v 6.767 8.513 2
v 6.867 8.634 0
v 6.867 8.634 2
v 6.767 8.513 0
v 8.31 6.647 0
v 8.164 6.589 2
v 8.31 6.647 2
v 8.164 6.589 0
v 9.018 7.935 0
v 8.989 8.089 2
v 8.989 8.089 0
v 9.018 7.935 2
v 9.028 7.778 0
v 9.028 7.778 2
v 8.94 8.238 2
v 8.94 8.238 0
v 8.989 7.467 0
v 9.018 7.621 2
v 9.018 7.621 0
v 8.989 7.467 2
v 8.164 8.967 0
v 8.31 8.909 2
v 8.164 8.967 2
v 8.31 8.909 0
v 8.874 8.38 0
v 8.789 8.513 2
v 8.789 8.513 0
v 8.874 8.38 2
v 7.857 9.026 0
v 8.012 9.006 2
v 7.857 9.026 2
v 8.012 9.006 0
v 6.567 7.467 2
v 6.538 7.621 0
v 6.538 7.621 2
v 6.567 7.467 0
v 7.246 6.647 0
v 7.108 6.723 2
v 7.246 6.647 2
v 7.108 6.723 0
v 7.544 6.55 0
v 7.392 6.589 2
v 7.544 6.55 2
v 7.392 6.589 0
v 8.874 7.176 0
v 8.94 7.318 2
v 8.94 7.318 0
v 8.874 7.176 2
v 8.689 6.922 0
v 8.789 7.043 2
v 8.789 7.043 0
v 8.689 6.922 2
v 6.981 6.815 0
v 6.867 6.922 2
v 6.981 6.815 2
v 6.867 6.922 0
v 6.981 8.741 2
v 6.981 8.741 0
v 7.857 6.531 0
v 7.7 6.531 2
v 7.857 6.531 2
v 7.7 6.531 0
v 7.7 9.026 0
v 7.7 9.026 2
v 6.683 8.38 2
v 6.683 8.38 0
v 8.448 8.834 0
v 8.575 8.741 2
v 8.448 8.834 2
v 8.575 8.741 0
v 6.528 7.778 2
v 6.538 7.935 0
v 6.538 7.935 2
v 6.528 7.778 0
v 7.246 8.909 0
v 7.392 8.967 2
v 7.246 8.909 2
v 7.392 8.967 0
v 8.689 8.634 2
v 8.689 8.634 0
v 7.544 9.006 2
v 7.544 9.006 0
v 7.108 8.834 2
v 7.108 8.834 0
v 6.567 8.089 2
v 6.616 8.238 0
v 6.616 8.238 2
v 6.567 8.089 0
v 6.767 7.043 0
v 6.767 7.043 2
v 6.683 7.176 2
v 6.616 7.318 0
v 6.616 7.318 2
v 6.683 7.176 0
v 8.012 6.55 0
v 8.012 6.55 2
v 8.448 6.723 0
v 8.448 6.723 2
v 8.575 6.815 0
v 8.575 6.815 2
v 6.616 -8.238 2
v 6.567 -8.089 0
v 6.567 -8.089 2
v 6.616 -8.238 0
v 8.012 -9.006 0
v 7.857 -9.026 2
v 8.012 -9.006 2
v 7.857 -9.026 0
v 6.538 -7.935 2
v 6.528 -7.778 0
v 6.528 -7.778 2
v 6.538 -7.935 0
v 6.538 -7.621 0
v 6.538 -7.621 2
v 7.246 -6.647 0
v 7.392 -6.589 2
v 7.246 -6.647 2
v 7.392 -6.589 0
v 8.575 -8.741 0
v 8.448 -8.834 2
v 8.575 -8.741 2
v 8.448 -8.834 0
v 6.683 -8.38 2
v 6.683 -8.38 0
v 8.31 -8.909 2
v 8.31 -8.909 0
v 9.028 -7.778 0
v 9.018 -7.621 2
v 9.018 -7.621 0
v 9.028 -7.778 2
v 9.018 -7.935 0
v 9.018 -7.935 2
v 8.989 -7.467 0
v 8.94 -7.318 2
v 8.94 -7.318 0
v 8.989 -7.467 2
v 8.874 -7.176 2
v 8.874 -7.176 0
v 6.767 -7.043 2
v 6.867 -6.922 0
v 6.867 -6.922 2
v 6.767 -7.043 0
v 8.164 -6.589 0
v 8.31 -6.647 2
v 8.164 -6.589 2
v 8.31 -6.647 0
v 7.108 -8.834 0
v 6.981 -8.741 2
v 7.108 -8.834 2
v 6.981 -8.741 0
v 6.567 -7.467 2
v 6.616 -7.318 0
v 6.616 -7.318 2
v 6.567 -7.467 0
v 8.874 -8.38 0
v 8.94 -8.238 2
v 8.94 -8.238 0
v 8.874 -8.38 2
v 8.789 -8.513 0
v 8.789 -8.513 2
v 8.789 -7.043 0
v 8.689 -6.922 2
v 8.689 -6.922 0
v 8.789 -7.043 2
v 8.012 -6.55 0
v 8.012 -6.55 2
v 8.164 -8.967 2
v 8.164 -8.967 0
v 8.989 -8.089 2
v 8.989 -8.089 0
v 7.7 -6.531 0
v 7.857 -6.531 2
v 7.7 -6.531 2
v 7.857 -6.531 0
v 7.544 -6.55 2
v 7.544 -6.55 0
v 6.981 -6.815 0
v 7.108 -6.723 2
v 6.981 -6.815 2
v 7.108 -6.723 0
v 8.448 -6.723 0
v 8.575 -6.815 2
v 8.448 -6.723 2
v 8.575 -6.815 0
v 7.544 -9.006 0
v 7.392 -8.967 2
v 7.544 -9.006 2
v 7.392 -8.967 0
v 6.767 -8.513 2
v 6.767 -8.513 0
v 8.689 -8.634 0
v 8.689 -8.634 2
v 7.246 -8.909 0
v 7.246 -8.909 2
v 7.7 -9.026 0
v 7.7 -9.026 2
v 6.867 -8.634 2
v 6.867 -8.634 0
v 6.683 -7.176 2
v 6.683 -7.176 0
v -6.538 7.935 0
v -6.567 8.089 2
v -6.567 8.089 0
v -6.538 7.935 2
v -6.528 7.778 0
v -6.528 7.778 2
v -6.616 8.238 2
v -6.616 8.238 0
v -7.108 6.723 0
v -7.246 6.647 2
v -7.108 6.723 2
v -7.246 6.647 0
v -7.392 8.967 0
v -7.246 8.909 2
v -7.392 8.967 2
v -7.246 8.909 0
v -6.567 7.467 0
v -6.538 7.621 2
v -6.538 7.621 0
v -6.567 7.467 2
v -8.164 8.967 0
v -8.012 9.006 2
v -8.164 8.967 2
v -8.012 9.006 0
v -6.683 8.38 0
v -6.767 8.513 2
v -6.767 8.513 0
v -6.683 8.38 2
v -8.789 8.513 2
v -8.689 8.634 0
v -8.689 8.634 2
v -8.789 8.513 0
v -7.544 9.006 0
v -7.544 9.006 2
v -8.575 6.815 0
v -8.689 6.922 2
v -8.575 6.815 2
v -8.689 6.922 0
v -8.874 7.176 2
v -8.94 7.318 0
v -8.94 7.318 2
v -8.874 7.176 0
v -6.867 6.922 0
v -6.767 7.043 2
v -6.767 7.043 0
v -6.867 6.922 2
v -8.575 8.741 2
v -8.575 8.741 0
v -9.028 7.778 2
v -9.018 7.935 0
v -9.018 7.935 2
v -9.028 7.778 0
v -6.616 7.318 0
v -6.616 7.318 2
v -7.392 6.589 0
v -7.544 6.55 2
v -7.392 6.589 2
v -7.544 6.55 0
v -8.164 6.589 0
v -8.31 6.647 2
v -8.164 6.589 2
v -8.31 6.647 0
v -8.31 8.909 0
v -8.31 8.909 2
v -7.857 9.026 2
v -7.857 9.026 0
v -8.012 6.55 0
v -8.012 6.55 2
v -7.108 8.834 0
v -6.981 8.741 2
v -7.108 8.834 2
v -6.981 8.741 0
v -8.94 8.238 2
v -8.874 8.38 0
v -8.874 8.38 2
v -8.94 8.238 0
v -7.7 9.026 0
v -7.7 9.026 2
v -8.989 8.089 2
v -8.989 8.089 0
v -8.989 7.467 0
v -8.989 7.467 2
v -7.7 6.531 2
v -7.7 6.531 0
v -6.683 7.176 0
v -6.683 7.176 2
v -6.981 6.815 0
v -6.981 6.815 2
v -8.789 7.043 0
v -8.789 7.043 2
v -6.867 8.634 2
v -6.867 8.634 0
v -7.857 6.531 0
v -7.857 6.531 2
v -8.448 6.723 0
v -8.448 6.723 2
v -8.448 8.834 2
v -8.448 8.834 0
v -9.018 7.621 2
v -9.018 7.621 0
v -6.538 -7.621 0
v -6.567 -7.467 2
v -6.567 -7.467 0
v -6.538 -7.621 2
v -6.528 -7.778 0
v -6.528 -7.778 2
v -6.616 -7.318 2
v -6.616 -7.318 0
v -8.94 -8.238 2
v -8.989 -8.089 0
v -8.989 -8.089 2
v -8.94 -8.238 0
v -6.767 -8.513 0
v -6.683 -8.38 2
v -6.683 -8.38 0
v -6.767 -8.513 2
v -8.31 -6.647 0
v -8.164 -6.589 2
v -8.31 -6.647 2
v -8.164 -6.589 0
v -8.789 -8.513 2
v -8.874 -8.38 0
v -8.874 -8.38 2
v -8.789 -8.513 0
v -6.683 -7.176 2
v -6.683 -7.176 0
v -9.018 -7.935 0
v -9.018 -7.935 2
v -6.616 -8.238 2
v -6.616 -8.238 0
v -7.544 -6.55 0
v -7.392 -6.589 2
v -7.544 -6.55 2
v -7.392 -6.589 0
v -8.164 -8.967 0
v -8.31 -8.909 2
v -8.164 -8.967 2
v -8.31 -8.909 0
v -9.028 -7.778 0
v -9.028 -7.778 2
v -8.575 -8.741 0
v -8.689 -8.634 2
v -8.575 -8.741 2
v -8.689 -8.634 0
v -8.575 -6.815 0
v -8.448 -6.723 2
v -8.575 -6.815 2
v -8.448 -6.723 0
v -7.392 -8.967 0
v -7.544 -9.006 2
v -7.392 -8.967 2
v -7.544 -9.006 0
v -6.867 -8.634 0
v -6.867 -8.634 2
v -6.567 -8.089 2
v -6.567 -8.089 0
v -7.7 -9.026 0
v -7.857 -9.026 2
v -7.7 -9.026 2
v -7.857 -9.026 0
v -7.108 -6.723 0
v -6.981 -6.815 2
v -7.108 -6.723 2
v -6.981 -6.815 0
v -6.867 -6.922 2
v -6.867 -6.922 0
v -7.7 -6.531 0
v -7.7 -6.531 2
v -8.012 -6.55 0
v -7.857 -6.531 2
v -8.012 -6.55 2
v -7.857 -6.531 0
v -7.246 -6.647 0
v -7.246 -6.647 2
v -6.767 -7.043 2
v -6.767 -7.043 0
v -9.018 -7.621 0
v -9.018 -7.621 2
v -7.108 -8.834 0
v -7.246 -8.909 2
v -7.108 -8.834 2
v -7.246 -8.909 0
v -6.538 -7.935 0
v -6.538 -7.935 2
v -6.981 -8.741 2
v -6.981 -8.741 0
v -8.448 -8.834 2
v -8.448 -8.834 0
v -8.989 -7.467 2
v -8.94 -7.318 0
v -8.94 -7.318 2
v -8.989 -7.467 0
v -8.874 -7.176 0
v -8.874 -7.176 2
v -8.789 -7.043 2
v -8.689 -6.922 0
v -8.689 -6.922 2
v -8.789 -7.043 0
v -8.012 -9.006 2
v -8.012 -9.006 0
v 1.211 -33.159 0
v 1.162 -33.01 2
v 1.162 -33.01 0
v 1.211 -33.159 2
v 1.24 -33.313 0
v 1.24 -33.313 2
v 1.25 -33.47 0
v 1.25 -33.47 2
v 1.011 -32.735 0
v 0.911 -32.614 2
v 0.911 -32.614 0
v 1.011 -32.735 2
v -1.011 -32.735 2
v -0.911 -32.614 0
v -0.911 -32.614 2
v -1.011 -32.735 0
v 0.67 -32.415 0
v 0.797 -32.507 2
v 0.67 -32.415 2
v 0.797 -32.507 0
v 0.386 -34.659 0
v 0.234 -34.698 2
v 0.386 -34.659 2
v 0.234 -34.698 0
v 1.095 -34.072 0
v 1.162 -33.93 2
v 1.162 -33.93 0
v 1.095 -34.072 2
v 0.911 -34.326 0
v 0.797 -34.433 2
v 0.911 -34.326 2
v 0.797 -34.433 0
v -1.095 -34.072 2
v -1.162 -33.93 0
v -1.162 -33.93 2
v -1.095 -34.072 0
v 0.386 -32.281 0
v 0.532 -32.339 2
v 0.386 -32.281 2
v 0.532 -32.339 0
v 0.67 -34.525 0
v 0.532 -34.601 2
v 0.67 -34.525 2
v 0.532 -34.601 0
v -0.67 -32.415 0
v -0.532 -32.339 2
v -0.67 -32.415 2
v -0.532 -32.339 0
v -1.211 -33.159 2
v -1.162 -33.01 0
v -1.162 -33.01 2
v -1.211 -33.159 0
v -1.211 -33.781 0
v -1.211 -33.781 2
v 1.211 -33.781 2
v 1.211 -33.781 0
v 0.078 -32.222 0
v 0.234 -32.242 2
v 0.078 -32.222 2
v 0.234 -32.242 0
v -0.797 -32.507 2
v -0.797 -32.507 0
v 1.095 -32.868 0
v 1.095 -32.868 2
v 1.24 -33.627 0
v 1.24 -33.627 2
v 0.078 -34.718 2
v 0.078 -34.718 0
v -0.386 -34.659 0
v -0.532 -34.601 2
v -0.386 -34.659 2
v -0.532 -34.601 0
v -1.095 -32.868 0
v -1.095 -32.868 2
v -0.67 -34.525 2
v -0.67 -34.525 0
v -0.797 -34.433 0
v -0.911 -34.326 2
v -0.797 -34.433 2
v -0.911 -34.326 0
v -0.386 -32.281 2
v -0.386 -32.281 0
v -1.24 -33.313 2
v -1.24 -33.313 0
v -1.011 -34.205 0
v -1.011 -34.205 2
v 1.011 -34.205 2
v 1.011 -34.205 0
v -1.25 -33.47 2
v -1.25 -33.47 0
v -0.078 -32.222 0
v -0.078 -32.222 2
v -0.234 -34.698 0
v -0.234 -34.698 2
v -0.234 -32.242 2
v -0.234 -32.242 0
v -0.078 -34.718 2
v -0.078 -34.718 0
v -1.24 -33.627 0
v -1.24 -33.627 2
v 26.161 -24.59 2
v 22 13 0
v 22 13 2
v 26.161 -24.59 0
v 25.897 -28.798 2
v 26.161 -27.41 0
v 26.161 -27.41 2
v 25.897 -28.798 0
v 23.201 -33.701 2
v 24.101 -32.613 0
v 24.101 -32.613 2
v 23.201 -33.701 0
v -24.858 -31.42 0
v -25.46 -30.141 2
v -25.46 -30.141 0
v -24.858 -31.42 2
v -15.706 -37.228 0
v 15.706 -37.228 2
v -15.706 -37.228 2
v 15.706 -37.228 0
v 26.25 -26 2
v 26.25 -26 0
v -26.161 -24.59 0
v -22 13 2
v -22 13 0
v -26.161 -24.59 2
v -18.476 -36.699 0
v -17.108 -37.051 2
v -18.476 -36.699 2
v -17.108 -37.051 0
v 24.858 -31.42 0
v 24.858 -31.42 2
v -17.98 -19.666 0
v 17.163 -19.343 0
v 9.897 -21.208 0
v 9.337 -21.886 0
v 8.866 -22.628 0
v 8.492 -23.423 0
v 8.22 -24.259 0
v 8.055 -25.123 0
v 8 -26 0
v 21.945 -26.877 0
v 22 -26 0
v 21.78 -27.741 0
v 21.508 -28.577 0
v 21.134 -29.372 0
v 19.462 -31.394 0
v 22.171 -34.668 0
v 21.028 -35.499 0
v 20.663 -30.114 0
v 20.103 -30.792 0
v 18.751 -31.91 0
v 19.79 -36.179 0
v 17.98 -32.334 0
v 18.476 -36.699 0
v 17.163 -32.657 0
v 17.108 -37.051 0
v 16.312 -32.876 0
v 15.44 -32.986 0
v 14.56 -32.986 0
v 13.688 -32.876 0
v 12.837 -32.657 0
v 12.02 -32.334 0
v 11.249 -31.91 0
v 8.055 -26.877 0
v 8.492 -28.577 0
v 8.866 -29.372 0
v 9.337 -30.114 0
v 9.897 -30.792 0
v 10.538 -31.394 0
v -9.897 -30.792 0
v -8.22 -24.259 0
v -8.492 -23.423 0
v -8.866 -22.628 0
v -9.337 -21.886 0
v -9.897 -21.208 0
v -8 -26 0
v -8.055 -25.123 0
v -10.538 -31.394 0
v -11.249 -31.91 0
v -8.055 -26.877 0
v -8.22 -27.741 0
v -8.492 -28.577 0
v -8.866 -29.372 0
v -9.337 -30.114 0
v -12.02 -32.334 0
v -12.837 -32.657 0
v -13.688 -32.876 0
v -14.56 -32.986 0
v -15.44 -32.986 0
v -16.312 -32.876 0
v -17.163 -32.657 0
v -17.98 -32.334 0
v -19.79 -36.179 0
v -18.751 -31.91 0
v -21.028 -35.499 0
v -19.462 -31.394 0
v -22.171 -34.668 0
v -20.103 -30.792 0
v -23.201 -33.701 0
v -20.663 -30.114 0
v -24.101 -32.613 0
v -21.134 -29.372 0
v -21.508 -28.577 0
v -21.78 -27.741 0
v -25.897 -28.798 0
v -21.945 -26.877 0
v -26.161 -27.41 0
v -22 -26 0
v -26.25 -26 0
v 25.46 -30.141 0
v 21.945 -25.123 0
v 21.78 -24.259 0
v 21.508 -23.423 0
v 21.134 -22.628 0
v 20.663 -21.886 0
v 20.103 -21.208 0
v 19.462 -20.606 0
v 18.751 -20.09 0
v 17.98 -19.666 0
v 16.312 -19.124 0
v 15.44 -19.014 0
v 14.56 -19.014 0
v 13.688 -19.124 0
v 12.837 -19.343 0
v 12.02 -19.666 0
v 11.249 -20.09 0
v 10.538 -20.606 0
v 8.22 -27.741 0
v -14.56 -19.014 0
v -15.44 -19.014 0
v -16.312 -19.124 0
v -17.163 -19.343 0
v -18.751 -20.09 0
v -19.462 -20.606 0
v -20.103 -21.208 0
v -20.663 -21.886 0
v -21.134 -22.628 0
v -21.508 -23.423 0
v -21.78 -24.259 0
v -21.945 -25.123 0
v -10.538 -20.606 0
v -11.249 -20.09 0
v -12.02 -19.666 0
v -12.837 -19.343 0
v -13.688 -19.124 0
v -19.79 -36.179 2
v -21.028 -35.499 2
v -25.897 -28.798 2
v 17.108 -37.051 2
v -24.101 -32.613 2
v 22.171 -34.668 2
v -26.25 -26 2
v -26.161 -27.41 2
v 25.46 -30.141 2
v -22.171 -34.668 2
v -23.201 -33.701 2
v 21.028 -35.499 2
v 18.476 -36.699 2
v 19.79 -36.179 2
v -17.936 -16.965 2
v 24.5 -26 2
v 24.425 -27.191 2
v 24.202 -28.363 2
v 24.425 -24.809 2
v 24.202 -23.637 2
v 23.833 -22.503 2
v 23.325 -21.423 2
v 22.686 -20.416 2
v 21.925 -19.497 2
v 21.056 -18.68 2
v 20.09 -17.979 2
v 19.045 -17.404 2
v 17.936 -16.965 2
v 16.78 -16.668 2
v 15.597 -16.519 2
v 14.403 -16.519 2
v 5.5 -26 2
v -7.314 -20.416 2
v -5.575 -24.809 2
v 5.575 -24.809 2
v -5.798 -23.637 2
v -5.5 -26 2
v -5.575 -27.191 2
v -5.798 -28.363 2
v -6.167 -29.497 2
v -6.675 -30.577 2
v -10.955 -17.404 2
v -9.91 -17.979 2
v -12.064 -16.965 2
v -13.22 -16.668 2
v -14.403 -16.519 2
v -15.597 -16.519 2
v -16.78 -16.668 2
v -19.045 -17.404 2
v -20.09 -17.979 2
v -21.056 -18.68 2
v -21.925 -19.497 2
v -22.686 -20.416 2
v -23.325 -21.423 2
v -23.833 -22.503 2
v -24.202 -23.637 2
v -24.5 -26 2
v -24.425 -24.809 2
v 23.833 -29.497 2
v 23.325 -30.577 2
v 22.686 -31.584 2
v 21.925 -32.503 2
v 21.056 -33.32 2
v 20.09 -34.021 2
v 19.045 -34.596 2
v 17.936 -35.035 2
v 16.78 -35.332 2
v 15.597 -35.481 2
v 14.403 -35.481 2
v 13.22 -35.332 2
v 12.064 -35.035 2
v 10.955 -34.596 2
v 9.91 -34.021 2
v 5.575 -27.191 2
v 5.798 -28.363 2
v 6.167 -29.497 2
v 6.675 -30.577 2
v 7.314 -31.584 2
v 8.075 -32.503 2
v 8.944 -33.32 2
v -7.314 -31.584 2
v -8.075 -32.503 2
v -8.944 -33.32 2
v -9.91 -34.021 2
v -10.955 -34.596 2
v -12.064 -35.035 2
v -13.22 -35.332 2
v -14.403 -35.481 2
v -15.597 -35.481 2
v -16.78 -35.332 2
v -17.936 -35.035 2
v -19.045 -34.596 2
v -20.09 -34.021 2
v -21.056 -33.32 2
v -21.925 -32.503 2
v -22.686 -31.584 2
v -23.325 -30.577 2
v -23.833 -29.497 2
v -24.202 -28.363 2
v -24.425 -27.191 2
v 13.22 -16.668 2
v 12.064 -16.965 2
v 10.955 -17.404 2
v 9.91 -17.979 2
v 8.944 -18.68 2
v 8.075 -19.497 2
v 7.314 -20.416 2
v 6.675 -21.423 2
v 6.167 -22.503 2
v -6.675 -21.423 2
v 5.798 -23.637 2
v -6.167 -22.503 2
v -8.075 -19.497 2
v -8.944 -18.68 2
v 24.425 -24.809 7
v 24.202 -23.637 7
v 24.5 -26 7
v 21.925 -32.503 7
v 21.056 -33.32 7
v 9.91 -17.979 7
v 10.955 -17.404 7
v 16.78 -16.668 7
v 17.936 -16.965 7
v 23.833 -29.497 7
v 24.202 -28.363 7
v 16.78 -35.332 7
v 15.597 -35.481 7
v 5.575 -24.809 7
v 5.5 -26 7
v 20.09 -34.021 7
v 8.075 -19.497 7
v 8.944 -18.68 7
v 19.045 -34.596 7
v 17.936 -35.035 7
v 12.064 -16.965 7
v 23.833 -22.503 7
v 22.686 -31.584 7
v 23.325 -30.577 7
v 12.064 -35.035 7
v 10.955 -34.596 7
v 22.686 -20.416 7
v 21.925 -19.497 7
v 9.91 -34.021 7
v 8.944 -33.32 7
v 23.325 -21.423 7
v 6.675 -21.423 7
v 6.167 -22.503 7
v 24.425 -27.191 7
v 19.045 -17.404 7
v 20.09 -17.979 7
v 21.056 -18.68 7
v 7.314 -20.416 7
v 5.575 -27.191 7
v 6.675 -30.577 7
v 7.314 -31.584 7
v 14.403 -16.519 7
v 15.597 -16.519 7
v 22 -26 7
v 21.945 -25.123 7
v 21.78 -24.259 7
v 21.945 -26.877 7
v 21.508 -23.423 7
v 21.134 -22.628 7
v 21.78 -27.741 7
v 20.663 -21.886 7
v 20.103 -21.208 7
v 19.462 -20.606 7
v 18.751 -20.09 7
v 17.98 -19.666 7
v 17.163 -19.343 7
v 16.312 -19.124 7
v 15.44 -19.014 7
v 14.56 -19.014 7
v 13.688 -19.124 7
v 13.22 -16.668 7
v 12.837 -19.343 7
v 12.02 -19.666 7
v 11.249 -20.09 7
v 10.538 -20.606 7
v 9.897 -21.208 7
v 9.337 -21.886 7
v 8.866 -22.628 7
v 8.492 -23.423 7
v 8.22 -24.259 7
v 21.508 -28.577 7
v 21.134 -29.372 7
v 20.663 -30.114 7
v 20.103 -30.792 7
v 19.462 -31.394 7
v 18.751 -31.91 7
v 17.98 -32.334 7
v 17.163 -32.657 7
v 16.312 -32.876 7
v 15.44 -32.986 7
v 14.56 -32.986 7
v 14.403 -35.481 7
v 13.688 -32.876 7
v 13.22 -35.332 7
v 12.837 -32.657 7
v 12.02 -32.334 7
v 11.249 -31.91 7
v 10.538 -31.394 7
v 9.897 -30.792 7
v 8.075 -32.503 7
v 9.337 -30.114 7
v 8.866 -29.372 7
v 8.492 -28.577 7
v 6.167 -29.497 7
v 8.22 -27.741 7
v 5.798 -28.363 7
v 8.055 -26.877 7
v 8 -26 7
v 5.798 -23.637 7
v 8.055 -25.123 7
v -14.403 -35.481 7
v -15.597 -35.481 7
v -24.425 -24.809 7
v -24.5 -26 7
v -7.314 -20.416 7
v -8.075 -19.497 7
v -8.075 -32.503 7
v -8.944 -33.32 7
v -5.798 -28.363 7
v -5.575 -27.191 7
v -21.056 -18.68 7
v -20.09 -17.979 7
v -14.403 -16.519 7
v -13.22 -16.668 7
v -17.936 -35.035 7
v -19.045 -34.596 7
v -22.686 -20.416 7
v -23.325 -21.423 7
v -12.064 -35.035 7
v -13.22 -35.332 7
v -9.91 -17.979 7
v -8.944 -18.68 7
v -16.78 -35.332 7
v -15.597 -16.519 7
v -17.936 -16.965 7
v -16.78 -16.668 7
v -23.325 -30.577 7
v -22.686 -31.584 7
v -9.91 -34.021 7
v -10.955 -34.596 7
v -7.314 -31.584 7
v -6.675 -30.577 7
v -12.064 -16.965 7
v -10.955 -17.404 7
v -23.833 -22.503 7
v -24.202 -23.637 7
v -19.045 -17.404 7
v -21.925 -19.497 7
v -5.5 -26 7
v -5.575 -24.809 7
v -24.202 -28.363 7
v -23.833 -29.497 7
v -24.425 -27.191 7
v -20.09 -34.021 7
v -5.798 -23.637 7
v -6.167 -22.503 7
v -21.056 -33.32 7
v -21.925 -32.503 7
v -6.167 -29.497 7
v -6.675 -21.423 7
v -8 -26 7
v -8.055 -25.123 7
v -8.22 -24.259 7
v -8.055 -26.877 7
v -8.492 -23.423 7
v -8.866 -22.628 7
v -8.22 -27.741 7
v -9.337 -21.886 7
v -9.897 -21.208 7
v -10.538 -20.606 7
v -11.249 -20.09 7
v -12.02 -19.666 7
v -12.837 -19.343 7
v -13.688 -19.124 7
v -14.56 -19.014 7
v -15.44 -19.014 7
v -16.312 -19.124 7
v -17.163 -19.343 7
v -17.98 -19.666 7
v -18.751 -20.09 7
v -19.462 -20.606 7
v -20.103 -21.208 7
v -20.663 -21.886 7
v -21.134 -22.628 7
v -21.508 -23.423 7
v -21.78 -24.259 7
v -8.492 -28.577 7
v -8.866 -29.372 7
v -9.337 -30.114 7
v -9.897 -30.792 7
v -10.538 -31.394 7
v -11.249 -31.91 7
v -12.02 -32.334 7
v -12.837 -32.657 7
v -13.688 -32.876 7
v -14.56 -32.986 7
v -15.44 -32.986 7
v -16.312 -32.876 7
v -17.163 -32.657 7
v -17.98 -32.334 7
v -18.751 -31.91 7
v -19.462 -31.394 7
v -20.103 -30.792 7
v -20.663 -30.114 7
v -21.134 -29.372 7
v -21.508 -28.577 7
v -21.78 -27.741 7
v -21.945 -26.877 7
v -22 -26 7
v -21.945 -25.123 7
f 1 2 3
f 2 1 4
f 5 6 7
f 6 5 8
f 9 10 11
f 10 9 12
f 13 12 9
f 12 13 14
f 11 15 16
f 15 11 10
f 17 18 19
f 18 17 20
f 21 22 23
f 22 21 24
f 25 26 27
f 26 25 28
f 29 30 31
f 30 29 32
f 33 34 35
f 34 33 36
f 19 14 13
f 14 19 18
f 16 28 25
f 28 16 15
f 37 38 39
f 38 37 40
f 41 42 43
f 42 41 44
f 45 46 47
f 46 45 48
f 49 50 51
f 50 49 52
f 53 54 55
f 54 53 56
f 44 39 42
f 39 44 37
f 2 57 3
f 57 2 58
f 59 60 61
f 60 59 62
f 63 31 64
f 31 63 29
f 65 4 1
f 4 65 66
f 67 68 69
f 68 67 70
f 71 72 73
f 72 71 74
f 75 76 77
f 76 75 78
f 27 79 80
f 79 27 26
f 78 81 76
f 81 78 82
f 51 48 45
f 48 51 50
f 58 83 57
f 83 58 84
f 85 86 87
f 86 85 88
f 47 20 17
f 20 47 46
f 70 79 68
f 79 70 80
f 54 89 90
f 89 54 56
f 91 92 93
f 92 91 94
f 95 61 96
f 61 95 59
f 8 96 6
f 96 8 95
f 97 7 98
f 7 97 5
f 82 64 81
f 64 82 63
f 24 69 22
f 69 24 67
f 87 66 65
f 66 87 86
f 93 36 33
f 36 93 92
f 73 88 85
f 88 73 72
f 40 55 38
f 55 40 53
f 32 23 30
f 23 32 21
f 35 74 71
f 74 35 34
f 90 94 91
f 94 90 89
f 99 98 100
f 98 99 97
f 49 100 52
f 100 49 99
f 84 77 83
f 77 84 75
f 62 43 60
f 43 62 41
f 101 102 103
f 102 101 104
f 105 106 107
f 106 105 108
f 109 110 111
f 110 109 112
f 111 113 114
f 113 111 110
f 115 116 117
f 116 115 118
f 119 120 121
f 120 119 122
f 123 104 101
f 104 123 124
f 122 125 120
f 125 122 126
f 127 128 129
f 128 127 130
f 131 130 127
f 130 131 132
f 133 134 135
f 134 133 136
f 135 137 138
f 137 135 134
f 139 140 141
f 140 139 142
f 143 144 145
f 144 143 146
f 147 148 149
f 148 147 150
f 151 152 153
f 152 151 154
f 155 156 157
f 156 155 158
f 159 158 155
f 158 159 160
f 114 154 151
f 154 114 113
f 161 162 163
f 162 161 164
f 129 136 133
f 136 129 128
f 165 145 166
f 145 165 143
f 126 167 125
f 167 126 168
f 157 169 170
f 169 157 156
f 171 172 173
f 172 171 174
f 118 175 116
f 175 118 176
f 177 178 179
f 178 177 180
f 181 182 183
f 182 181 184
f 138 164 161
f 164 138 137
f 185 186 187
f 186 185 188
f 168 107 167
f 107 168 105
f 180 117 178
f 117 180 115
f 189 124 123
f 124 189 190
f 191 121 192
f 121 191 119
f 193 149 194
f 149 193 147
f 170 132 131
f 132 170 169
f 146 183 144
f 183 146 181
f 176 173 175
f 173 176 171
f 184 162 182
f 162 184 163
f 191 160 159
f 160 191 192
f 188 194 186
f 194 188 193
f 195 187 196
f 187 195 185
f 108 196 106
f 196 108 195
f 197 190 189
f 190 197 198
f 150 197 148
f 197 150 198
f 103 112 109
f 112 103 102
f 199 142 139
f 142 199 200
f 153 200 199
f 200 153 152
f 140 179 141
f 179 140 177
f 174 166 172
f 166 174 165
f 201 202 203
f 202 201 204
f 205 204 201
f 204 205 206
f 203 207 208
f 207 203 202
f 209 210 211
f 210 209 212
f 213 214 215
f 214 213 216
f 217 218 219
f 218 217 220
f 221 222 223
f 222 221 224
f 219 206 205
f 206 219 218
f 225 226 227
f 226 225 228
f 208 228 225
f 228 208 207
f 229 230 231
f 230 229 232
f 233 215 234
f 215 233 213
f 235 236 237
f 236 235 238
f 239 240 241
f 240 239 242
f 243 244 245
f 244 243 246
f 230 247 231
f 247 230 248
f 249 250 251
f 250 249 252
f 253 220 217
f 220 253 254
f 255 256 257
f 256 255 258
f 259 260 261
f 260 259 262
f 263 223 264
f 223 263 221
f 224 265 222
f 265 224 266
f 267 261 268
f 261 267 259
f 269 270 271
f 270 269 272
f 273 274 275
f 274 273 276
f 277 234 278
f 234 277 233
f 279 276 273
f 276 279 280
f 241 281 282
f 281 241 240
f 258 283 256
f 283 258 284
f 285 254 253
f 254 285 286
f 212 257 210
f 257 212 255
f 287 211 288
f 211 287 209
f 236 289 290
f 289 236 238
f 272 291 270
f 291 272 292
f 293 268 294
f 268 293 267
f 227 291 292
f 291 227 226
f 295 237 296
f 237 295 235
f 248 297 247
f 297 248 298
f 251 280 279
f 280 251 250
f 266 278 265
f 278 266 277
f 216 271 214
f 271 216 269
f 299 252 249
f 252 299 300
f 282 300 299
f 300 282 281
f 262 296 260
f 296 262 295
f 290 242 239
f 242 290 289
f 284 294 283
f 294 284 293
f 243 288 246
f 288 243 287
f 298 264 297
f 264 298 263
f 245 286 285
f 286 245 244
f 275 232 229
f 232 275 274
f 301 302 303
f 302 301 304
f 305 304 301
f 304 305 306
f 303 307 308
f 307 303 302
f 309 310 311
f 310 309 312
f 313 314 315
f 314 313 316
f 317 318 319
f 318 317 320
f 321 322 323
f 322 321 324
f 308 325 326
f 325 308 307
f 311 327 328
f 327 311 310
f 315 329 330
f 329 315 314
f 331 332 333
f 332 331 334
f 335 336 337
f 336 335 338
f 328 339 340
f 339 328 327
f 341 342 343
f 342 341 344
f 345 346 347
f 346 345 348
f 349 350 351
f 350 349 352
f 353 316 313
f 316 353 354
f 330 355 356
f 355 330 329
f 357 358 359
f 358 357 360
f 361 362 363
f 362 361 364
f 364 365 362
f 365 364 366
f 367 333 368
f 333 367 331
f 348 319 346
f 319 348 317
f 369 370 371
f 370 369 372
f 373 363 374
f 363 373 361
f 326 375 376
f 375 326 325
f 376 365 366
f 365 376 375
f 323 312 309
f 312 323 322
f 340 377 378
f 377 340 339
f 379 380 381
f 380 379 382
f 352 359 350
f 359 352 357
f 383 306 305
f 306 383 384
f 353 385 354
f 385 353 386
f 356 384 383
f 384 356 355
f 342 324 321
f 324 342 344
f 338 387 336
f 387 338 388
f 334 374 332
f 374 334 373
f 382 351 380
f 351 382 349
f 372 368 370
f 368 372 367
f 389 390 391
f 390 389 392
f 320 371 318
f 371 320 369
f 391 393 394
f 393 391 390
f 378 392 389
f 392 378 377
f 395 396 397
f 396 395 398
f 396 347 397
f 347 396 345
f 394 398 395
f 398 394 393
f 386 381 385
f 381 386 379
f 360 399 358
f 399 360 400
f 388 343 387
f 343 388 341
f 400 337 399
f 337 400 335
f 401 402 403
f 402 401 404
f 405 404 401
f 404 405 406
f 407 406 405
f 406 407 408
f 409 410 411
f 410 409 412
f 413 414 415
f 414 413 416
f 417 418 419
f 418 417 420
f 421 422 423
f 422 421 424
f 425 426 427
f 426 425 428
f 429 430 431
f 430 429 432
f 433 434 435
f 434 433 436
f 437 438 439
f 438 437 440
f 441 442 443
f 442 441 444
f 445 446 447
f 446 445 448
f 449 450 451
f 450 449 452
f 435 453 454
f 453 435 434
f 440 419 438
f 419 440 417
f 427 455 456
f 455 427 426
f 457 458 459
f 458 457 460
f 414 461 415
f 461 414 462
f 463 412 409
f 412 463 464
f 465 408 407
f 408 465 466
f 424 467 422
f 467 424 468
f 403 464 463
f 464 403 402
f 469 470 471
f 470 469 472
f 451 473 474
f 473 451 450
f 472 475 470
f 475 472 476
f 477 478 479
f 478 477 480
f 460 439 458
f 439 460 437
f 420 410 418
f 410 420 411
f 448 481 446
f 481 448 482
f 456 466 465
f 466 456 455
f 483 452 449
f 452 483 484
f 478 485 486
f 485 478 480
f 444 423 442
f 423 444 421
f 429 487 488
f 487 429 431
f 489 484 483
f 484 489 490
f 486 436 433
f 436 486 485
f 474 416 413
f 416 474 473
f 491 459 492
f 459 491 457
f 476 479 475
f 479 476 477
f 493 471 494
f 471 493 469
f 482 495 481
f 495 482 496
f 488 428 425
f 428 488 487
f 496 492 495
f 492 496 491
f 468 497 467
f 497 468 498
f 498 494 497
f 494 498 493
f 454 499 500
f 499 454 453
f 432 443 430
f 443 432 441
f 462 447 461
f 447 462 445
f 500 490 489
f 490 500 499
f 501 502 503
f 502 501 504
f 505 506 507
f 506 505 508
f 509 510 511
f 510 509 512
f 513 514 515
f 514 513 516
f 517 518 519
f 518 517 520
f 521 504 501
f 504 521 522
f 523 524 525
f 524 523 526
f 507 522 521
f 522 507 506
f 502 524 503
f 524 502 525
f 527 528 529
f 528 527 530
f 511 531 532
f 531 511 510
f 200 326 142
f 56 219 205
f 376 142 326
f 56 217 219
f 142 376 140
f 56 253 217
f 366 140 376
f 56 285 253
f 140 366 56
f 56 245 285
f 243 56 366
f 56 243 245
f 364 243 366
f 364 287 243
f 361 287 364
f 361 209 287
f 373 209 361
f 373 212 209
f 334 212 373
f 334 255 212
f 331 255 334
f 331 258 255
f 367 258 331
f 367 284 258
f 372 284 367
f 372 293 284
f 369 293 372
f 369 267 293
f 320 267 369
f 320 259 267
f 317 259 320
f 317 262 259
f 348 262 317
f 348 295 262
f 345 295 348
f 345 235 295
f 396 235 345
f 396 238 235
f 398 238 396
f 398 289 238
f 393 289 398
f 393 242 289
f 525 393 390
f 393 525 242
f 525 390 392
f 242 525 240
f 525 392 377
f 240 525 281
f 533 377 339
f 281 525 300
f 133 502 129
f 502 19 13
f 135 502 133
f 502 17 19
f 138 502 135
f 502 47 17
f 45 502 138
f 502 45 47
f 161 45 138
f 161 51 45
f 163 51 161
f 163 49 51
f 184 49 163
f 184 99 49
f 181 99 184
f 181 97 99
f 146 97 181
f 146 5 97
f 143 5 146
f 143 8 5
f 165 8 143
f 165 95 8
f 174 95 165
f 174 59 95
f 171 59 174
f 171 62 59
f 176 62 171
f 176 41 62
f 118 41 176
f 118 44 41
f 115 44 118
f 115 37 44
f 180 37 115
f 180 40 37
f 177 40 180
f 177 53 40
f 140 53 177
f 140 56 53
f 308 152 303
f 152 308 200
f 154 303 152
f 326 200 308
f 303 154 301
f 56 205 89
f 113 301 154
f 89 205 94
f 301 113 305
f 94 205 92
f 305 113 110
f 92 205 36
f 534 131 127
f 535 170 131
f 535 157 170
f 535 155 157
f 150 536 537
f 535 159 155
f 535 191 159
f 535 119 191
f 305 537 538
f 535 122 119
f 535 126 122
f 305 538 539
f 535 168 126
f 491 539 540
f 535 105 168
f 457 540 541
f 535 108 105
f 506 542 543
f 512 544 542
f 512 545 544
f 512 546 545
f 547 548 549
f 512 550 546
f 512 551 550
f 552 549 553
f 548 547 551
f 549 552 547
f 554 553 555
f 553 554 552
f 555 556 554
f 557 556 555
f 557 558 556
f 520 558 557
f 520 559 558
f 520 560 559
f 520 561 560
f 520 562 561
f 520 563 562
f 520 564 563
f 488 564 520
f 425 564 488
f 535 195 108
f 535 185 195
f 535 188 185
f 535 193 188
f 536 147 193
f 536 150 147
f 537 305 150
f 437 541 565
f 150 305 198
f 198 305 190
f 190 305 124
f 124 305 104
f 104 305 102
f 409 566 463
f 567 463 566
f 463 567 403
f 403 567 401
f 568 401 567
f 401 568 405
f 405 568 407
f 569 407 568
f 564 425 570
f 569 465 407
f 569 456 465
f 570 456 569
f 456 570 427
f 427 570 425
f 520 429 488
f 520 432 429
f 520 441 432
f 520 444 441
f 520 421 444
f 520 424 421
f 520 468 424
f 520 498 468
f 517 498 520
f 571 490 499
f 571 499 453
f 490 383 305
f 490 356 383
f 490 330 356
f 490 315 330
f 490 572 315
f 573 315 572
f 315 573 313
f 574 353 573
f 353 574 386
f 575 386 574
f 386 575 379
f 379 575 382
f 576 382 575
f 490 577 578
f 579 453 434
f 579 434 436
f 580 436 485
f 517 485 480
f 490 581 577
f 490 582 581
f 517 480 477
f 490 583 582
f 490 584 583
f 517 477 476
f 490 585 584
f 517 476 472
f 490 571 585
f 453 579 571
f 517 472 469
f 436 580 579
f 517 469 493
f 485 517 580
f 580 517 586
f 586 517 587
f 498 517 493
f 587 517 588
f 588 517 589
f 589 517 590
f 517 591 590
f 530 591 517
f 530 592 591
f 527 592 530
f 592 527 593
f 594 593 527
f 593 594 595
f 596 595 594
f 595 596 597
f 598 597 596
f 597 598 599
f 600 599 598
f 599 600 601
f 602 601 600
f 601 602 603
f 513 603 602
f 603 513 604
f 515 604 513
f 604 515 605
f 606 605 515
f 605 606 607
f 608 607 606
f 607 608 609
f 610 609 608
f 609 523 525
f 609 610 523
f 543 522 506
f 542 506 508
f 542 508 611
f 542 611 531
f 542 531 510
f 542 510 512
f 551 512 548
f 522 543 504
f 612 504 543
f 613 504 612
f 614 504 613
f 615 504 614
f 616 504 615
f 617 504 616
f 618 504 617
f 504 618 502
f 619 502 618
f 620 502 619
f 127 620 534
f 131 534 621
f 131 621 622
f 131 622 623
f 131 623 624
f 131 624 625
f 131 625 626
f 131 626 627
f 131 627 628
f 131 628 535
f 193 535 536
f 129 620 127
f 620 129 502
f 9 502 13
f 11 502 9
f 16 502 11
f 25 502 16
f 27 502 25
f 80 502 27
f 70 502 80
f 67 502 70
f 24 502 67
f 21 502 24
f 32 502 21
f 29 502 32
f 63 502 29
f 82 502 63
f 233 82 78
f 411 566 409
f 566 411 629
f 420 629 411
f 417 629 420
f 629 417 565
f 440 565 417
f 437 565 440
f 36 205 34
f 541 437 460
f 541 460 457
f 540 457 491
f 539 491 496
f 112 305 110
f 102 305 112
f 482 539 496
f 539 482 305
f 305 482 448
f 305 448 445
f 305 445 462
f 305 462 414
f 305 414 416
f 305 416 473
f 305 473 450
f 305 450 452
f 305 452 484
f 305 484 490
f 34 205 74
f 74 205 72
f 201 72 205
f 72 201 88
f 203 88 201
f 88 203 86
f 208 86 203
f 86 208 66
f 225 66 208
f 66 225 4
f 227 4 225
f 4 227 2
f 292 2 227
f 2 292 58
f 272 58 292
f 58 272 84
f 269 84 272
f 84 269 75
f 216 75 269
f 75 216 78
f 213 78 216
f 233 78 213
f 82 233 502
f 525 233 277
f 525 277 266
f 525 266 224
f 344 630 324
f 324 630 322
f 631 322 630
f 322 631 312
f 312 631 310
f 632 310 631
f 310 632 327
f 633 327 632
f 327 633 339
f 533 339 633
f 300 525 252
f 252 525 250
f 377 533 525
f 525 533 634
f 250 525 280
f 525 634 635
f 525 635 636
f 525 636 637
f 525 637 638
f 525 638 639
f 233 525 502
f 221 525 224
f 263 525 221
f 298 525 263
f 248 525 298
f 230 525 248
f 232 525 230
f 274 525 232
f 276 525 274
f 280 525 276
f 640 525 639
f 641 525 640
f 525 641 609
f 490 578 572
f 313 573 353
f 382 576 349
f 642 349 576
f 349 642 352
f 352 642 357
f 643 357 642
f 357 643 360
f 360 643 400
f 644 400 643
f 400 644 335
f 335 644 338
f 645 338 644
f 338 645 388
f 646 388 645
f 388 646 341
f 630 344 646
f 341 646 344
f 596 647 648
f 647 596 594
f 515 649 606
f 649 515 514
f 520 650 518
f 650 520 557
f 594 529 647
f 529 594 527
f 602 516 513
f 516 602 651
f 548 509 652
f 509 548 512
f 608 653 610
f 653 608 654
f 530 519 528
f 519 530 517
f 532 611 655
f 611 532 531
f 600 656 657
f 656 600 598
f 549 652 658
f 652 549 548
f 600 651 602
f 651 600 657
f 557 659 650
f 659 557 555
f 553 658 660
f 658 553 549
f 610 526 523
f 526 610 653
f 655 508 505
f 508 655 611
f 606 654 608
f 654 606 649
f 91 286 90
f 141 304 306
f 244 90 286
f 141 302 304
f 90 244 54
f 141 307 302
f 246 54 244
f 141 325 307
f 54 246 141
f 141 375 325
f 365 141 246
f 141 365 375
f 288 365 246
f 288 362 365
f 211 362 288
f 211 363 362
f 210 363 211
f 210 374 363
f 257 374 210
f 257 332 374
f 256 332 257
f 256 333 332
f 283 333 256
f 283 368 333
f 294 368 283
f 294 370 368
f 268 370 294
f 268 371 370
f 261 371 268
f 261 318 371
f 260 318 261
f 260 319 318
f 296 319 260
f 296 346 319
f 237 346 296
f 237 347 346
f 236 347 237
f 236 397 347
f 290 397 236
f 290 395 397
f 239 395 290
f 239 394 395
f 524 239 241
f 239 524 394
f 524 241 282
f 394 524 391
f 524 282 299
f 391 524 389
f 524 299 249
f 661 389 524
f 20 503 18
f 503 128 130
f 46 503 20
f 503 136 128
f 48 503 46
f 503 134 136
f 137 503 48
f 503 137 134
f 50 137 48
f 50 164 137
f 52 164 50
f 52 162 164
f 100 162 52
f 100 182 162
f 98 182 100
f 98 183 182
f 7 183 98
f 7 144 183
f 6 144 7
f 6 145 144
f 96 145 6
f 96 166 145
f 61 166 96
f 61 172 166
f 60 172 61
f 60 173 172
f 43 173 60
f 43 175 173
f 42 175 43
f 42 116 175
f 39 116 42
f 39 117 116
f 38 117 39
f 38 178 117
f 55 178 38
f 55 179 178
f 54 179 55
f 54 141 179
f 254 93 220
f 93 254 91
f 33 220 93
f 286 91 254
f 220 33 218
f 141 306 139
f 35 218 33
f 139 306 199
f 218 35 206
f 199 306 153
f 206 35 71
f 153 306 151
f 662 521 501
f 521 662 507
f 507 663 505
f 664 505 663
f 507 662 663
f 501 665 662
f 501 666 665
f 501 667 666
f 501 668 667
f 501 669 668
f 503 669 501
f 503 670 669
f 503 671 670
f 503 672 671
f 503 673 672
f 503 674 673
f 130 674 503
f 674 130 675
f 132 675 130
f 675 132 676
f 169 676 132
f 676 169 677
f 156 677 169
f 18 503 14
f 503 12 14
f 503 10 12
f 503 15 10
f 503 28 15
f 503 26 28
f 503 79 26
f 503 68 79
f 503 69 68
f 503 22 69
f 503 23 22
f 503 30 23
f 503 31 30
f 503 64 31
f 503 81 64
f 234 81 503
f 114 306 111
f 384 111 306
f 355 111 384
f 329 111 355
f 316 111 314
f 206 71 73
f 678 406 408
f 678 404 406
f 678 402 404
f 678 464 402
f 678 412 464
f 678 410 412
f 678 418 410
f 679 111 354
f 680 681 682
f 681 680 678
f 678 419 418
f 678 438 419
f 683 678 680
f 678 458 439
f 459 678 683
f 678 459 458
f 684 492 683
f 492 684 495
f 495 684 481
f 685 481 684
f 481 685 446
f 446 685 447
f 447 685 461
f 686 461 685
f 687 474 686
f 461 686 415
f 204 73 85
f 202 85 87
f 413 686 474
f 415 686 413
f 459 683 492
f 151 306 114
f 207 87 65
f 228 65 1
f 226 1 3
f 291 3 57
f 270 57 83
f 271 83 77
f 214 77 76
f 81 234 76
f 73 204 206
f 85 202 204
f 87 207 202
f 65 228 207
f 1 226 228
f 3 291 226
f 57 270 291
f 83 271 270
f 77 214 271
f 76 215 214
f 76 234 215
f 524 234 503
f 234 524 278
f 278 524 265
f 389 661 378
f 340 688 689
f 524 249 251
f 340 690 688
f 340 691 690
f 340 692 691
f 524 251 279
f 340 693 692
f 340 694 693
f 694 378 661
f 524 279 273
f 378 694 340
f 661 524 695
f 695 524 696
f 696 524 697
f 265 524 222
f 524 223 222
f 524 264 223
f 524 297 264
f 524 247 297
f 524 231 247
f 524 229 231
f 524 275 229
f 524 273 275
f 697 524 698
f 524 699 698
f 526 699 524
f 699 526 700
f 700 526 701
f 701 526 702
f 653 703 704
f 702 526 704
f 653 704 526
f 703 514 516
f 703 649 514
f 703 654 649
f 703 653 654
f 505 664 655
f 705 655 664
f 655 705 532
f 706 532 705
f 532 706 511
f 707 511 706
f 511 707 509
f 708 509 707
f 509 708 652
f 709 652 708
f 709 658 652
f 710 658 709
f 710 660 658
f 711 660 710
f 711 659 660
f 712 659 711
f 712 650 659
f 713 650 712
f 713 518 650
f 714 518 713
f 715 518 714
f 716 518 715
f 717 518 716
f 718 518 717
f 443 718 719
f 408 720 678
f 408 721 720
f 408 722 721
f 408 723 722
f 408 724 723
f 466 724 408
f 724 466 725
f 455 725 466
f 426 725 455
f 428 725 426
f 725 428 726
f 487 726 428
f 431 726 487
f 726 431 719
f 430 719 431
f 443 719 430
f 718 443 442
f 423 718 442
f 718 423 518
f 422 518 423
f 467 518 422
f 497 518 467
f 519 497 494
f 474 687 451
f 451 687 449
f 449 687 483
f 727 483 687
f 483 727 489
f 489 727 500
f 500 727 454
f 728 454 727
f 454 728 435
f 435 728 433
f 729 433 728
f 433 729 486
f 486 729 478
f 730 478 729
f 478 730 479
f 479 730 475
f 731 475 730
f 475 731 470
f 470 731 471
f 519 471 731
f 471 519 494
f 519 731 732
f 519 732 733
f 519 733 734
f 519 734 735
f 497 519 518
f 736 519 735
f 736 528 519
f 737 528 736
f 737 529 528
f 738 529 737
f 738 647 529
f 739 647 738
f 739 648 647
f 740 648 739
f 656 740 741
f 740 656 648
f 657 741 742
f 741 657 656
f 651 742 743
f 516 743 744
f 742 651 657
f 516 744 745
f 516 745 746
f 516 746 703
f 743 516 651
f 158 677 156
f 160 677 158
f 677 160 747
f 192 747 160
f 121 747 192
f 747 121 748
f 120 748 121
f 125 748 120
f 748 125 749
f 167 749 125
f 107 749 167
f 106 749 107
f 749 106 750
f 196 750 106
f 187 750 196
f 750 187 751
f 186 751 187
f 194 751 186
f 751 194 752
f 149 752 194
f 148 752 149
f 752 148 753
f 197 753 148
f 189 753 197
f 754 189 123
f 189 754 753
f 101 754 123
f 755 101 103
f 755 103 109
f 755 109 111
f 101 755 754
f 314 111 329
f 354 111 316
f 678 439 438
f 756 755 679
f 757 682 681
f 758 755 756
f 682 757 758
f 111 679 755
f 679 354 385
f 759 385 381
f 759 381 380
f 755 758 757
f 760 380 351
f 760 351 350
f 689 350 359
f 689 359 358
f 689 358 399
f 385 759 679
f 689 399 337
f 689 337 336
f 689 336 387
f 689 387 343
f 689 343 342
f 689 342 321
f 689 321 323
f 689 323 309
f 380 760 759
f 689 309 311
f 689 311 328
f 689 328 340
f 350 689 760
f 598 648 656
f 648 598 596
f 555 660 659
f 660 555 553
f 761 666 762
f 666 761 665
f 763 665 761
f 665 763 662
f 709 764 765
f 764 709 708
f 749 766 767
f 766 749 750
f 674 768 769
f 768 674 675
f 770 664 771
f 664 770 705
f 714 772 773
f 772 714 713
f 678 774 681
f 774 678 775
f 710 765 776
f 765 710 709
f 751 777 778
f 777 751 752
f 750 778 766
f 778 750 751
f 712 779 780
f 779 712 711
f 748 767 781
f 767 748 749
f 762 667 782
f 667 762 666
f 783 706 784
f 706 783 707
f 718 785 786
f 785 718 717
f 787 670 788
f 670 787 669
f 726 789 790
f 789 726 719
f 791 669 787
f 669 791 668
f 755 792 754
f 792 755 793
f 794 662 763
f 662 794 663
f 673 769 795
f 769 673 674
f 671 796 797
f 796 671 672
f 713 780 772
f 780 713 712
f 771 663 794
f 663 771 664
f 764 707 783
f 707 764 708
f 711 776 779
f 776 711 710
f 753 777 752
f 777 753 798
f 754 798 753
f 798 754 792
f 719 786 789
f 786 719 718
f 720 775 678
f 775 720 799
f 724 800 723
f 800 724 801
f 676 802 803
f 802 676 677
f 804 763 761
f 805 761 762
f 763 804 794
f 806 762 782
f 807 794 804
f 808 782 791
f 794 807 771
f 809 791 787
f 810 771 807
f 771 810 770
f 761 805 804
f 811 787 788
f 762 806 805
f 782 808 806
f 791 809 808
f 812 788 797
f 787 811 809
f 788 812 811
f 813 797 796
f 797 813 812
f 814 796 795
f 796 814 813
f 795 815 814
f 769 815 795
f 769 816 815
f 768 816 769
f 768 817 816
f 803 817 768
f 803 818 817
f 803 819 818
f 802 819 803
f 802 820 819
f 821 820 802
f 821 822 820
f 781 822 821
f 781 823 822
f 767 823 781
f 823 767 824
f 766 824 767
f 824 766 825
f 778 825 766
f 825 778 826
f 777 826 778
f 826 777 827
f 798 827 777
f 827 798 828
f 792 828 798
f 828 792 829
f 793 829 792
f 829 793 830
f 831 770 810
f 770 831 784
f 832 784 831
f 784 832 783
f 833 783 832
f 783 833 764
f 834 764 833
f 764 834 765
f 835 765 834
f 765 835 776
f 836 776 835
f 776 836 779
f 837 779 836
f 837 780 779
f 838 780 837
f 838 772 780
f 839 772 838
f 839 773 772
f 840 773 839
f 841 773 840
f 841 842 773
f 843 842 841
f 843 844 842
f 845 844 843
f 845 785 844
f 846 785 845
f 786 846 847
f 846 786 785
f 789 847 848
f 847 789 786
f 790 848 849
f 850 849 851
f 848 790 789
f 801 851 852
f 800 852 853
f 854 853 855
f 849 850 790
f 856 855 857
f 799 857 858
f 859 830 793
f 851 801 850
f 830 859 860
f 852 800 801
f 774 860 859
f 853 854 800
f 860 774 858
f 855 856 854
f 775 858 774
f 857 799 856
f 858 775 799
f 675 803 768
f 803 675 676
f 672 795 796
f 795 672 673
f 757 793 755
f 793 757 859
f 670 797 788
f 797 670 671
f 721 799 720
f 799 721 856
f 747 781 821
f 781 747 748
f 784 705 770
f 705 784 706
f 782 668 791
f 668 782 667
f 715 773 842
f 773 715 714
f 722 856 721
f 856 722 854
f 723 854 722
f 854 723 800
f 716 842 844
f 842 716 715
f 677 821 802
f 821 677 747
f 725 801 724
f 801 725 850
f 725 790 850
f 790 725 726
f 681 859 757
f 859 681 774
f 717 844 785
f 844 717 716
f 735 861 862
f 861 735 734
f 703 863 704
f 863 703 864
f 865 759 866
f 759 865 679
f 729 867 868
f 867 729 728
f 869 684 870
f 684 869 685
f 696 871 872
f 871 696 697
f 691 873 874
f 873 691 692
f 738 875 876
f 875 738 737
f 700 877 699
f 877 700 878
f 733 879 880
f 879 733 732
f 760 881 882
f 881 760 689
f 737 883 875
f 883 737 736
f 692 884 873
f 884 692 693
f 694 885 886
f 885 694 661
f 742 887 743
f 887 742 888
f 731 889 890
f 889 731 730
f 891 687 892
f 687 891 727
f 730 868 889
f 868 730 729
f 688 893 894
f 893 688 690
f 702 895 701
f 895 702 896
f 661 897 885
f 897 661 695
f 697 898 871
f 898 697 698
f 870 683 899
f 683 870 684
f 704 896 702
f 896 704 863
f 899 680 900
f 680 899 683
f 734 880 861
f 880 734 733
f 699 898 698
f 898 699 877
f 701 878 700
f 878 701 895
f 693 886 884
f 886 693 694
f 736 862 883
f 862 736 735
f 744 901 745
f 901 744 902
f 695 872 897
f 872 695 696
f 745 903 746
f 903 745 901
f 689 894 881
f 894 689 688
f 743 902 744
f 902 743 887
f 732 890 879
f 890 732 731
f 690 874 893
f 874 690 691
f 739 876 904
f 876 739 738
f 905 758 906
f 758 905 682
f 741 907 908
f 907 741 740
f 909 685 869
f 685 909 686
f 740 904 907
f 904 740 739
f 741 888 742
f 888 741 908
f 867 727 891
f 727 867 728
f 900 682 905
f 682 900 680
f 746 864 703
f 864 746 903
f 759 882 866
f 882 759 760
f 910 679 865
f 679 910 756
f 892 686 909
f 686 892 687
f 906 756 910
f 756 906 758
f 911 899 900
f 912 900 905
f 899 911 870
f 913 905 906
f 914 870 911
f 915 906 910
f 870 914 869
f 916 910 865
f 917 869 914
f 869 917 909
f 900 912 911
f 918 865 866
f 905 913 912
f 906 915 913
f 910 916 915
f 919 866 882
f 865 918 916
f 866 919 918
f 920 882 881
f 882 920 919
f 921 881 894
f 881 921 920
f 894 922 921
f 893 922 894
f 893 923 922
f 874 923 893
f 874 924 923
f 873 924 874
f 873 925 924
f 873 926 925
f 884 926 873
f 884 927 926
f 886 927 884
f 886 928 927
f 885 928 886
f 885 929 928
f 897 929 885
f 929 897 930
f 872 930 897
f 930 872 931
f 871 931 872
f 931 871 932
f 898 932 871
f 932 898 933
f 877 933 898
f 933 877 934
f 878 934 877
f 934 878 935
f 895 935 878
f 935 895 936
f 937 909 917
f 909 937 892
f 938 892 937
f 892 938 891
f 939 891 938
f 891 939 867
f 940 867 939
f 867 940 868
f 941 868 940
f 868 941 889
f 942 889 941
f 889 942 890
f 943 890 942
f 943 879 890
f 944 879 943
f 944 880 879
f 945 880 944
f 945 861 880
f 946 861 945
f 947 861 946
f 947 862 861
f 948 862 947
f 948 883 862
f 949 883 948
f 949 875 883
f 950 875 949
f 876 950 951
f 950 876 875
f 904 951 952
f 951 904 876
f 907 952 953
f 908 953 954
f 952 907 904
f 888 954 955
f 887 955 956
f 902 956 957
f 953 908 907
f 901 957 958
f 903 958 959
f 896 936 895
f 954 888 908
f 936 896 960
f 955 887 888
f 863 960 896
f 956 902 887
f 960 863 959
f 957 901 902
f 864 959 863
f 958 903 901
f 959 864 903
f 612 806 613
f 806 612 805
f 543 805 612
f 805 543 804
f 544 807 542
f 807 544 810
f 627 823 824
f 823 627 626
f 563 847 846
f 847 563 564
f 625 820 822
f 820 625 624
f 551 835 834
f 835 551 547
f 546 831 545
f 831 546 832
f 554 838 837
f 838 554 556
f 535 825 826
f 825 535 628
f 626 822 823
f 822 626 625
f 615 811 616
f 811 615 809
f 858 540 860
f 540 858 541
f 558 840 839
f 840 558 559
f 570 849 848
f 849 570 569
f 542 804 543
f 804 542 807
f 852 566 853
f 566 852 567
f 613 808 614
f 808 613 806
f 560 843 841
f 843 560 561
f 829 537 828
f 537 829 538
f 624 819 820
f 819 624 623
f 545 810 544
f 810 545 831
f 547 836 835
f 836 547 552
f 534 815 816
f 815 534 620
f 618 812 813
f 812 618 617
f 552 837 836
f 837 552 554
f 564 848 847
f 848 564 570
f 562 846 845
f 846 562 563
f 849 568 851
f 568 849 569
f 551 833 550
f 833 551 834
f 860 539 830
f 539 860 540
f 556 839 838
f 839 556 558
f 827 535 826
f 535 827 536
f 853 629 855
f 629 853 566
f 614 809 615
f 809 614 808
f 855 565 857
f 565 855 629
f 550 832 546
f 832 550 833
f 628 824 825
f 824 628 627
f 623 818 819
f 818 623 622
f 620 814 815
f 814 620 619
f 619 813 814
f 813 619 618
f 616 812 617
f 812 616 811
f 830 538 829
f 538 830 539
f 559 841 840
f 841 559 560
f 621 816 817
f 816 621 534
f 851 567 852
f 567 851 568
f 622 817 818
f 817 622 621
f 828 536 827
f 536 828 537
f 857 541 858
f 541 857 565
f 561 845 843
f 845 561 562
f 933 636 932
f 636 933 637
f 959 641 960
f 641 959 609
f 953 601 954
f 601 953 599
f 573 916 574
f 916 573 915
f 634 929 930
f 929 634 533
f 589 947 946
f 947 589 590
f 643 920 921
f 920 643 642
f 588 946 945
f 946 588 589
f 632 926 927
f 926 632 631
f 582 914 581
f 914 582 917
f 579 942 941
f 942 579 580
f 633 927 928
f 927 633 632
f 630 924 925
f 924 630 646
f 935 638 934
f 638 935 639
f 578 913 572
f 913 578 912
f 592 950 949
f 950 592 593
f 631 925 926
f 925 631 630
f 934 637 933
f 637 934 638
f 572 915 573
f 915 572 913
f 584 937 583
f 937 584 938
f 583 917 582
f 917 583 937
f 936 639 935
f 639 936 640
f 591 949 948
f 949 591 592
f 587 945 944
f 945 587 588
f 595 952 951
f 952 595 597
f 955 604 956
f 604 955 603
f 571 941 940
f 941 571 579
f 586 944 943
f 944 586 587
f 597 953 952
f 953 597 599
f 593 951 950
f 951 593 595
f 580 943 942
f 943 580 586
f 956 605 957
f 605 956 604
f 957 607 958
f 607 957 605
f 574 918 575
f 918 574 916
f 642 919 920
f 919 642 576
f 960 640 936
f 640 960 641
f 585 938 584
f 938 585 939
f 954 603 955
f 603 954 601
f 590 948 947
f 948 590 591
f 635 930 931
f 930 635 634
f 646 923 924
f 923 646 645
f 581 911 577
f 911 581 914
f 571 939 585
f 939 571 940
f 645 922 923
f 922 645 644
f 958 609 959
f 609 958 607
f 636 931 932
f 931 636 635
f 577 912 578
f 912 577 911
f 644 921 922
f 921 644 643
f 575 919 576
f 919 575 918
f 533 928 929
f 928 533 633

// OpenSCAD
// file: modules.scad
// This makes a holow part useful to make rounded corners. Better than a long
// description, play with the parameters to see how you can use it for your parts.
module corner_rounder(radius, height) {
  difference() {
    translate([-radius/2, -radius/2, 0])
    cube([radius, radius, height], center=true);
    translate([-radius, -radius, 0])
      cylinder(h=height+2, r=radius, center=true);
  }
}

// These are the cylinders to dig holes in support_guidage and bouchon, to attach
// them together.
module mounting_holes(){
  // four mounting holes
  translate([7.77815, 7.77815, -1]) cylinder(h=10, r=1.25);
  translate([7.77815, -7.77815, -1]) cylinder(h=10, r=1.25);
  translate([-7.77815, 7.77815, -1]) cylinder(h=10, r=1.25);
  translate([-7.77815, -7.77815, -1]) cylinder(h=10, r=1.25);
  // a fith mounting hole between the two pipe holders
  translate([0, -26-11.25+3.78, -1]) cylinder(h=10, r=1.25);
}

// Builds a module to attach to a dynamixel actuator
// @param branch_thickness thickness of the part
// @param distance between base and motor's center
// @param margin margin on center hole's diameter (adjust for 3D printing
//  inaccuracies)
module actuator_attachment(branch_thickness, length, margin = 0) {
  width = 22;
  difference() {
    cube([width, length+2, branch_thickness]);

    // cylindrical hole
    translate([width/2, length, -1])
      cylinder(h=branch_thickness+2, d=8+margin);
    // opening of the hole
    translate([width/2-(8+margin)/2, length, -1])
      cube([8+margin, 8, branch_thickness+2]);

    // round cornerd
    rounding_radius = 2;
    translate([width, length+2, branch_thickness/2])
      corner_rounder(rounding_radius, branch_thickness);
    translate([(width+8+margin)/2, length+2, branch_thickness/2])
      rotate([0, 0, 90])
        corner_rounder(rounding_radius, branch_thickness);

    translate([0, length+2, branch_thickness/2])
      rotate([0, 0, 90])
        corner_rounder(rounding_radius, branch_thickness);
    translate([(width-8-margin)/2, length+2, branch_thickness/2])
      corner_rounder(rounding_radius, branch_thickness);

    screw_radius = 8;
    translate([width/2, length, 0])
      for (angle=[180:45:360]) {
        translate([screw_radius*cos(angle), screw_radius*sin(angle), -1])
          cylinder(h=branch_thickness+2, d=2);
      }
  }
}
// main file
use <modules.scad>

// increase number of faces on rounded faces
$fn=50;
cap();

//////////
// Modules
//////////

module cap() {
  bearing_caps() {
    difference() {
        base();
        mounting_holes();
    }
  }
}

module base() {
  hull() {
    translate([-22, -13, 0]) cube([44, 26, 2]);

    translate([15, -26, 0]) cylinder(h=2, r=11.25);
    mirror([1, 0, 0]) translate([15, -26, 0]) cylinder(h=2, r=11.25);
  }
}

module bearing_caps() {
  // caps over the pipe holders
  difference () {
    union() {
      translate([15, -26, 1]) cylinder(h=6, r=9.5);
      mirror([1, 0, 0]) translate([15, -26, 1]) cylinder(h=6, r=9.5);
      children();
    }

    // Holes in the cap to let the pipes go through.
    translate([15, -26, -1])
      cylinder(h=9, r=7);
    mirror([1, 0, 0])
      translate([15, -26, -1])
        cylinder(h=9, r=7);
  }
}
